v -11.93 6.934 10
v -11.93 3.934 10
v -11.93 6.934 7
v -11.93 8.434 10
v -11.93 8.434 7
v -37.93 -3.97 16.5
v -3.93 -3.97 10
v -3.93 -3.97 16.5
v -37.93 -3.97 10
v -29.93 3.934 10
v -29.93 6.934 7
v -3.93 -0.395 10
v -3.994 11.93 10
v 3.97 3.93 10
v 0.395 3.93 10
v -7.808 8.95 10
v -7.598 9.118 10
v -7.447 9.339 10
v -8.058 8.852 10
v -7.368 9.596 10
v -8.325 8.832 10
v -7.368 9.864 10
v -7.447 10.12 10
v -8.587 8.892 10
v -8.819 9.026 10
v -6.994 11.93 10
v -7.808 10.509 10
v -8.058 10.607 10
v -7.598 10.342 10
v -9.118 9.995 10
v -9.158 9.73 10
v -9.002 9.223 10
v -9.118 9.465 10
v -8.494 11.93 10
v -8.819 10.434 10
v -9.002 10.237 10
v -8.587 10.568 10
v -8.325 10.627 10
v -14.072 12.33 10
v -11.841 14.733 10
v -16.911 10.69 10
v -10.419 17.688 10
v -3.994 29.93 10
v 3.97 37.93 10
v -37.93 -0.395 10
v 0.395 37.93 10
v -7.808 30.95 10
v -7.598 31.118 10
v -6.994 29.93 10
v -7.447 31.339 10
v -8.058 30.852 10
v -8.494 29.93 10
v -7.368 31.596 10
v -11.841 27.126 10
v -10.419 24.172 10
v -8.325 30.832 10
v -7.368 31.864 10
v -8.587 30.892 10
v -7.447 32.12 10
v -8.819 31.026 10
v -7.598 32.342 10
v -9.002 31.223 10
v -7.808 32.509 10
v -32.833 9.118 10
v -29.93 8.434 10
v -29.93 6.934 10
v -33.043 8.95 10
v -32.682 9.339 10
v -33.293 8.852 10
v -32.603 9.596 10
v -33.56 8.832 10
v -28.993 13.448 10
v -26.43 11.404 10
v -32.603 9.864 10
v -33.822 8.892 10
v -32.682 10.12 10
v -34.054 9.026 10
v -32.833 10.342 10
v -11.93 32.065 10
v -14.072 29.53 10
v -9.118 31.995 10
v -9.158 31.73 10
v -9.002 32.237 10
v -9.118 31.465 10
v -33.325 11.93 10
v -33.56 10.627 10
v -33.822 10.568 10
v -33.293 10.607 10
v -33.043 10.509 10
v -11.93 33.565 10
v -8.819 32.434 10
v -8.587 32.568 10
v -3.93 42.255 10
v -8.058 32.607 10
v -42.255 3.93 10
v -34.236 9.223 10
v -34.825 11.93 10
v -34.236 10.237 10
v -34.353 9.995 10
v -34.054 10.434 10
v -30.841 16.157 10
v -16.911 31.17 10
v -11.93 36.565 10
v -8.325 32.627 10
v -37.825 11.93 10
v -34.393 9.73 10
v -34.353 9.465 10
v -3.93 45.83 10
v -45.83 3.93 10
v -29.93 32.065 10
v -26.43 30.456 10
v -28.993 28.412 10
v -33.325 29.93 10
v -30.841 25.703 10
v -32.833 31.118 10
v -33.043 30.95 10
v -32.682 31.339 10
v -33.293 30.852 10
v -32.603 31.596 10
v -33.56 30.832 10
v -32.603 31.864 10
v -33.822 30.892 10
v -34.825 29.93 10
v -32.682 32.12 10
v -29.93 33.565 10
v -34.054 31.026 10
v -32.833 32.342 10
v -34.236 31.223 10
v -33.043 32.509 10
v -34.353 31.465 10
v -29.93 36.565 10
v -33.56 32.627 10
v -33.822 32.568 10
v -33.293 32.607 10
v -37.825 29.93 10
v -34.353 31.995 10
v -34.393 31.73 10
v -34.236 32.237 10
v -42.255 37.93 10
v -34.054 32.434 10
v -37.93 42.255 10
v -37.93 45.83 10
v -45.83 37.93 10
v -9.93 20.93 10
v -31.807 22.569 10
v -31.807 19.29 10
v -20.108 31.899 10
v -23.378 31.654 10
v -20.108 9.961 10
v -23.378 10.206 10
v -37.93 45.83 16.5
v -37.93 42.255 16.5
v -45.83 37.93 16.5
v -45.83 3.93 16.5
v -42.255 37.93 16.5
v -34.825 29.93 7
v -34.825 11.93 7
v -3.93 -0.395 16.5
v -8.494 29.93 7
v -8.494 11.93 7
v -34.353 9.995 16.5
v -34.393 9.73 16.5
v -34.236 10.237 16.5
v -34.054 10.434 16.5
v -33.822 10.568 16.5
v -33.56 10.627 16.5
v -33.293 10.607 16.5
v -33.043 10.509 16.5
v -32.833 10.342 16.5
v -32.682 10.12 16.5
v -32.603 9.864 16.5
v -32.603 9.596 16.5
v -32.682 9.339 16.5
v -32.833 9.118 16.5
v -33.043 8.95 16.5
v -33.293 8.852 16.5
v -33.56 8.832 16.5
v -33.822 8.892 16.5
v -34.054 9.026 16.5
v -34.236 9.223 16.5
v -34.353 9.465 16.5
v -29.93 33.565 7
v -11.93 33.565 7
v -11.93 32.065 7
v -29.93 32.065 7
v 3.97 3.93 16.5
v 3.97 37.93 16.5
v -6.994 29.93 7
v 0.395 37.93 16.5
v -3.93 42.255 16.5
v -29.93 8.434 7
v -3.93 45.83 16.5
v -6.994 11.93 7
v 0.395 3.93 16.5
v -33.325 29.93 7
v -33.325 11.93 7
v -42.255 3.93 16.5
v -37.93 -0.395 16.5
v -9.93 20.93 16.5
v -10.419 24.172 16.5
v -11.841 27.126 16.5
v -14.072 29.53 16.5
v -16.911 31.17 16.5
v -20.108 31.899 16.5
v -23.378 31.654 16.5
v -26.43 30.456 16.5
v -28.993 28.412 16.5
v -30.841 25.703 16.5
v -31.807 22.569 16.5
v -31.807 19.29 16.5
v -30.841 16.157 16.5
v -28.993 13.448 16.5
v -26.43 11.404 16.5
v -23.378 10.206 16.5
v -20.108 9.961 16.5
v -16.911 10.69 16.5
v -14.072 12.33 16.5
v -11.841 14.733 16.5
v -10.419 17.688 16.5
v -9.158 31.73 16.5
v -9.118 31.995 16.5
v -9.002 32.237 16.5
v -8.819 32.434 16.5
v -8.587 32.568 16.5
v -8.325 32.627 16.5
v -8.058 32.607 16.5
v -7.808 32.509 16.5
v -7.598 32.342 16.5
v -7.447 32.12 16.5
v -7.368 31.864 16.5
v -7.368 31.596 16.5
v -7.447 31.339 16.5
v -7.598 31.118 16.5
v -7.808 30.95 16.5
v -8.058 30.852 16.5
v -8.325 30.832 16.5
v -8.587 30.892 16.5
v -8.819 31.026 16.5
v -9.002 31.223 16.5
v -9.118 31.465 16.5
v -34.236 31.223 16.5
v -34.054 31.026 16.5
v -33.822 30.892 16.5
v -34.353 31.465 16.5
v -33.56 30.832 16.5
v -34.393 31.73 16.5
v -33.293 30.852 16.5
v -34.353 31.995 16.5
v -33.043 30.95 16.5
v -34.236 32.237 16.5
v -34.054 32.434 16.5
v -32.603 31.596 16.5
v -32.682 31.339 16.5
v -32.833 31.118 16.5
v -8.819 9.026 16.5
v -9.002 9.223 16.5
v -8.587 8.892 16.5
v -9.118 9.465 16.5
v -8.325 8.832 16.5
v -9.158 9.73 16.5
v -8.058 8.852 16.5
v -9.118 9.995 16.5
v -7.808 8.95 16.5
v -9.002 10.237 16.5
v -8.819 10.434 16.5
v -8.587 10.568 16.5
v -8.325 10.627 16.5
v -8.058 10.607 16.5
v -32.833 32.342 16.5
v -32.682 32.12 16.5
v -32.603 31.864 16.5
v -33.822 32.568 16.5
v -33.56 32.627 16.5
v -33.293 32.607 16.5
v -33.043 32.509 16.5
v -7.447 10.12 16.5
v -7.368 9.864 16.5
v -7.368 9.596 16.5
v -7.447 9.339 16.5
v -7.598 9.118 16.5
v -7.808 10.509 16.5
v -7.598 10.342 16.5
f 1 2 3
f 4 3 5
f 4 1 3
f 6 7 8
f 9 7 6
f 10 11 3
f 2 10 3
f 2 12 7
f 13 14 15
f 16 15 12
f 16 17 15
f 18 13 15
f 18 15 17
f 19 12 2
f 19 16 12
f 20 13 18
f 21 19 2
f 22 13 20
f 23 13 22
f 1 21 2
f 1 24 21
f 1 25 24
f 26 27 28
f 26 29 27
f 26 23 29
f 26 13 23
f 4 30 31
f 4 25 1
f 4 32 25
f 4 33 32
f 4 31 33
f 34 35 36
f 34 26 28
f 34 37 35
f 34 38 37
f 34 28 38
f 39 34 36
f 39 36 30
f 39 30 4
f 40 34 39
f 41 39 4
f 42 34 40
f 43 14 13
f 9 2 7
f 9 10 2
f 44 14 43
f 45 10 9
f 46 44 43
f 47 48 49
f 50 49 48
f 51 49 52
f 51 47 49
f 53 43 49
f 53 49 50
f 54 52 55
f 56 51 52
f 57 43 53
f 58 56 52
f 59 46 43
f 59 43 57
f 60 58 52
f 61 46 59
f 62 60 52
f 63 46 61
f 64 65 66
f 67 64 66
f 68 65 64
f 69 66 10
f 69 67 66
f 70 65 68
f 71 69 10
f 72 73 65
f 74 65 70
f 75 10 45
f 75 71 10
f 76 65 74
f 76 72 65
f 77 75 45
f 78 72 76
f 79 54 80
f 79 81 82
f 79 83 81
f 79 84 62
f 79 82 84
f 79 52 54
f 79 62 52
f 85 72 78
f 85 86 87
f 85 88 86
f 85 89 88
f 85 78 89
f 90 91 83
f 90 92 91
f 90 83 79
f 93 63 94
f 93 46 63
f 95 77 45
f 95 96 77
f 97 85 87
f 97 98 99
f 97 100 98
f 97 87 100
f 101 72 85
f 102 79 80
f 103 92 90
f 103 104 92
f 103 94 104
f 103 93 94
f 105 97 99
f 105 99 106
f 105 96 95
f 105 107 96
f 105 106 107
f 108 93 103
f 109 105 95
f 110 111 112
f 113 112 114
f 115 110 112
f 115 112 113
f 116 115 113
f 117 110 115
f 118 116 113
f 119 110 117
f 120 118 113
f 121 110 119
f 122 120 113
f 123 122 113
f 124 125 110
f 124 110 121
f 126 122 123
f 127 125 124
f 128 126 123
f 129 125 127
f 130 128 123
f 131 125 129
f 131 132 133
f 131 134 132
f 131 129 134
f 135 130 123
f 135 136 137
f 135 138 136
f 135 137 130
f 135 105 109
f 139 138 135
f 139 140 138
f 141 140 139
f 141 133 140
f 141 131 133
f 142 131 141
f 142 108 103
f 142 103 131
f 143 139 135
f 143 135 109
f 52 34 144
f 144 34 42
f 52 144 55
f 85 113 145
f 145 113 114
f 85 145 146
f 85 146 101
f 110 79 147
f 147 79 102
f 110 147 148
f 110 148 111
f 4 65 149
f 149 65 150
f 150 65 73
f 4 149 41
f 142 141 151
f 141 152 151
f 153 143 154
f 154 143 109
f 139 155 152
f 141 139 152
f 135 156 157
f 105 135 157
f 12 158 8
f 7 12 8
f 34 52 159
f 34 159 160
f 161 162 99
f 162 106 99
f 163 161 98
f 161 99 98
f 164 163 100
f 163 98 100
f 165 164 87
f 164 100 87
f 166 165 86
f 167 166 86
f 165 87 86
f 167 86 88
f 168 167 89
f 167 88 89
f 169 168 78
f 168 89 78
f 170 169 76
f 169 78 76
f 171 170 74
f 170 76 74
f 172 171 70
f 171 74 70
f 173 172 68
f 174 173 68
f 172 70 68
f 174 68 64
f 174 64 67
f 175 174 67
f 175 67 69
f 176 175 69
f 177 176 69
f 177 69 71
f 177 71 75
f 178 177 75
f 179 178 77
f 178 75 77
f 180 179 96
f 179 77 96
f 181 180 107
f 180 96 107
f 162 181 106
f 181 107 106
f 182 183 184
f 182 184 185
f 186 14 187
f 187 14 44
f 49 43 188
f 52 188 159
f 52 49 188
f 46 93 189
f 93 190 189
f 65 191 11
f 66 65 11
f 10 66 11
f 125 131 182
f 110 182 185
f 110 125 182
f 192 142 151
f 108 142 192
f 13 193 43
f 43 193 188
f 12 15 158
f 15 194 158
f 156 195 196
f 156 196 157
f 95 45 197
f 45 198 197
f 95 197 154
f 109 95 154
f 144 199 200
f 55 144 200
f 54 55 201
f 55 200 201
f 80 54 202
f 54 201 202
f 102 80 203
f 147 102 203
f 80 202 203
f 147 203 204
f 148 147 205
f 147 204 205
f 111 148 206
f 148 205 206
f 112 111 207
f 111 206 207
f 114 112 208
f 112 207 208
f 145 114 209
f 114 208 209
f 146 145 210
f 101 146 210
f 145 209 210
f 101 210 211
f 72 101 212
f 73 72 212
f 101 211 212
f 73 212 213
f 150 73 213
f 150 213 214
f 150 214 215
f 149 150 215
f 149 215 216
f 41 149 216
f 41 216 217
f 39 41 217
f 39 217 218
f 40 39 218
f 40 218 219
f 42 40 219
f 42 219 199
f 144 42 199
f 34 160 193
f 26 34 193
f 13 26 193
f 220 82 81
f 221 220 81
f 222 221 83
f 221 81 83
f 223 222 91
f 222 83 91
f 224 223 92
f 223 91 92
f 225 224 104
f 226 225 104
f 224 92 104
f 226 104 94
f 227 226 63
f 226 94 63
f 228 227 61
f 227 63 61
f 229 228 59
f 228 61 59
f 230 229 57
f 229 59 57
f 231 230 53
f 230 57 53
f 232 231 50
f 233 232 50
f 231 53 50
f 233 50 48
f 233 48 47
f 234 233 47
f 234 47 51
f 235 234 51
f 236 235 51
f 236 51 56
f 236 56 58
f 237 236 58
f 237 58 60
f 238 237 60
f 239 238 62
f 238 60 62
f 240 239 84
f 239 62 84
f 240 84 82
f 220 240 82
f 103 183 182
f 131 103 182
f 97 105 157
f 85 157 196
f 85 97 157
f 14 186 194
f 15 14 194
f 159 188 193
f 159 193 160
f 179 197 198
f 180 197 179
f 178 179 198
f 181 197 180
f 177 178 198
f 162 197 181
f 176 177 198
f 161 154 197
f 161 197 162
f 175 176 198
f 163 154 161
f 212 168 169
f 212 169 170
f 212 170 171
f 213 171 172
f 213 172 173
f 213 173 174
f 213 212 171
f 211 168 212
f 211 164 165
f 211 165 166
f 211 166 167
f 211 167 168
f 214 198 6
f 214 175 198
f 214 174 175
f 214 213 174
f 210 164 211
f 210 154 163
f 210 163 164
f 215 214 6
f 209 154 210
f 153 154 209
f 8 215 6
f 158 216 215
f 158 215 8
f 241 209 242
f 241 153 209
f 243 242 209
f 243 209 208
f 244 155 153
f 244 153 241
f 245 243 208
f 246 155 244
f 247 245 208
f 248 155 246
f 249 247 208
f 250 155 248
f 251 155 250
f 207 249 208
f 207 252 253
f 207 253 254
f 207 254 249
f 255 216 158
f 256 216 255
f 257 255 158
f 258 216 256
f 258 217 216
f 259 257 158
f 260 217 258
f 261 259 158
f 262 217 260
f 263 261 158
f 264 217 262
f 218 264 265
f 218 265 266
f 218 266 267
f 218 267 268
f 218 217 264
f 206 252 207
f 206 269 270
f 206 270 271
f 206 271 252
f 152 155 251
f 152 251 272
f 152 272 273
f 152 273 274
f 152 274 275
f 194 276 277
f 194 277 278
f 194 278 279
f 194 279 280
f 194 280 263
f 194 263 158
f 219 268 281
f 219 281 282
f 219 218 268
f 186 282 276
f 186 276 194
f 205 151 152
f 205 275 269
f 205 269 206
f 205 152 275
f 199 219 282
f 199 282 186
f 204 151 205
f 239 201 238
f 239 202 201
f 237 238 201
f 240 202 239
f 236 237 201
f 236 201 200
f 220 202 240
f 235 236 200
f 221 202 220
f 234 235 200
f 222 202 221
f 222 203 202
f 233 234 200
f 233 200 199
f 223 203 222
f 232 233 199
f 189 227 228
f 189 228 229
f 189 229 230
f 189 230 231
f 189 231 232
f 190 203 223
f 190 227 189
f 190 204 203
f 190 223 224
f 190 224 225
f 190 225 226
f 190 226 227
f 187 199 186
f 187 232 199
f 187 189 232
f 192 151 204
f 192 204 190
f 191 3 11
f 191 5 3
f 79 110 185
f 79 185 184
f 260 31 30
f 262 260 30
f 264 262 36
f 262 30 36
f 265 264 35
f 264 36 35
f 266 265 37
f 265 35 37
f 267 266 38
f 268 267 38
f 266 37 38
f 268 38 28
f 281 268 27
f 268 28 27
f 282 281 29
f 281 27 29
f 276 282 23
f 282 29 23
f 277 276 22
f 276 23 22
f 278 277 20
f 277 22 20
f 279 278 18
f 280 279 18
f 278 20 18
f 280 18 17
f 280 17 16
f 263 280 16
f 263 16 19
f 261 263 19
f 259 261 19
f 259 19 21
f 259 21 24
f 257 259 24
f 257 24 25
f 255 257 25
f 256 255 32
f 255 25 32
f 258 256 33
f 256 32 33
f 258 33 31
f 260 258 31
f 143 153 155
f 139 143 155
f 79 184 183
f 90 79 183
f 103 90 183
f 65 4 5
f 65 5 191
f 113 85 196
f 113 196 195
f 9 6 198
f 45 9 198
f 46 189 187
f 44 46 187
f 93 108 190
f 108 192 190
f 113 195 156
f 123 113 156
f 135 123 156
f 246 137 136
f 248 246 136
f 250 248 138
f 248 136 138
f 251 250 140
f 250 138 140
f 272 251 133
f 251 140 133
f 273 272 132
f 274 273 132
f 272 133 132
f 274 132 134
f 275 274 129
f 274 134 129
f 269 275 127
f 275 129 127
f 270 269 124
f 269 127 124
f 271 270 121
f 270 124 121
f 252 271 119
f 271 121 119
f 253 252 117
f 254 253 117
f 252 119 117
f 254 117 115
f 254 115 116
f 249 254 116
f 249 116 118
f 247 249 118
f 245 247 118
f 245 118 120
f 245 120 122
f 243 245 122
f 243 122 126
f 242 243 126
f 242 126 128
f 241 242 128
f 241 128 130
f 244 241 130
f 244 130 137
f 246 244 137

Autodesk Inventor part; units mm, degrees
ref_plane "YZ Plane" through (0, 0, 0) normal (1, 0, 0) x (0, 1, 0)
ref_plane "Work Plane1" through (0, 0, 10) normal (0, 0, 1) x (1, 0, 0)
sketch "Sketch1" plane through (0, 0, 10) normal (0, 0, 1) x (1, 0, 0)
  line L0 (-4.0299, -0.3538) -> (-2.2322, 1.4439) construction
  arc A0 (-1.4439, 2.2322) -> (-2.2322, 1.4439) centre (-0.9299, 0.9299) ccw construction
  line L1 (-1.4439, 2.2322) -> (0.3538, 4.0299) construction
  line L2 (-37.8299, 42.2137) -> (-37.8299, 45.8299) construction
  line L3 (-37.8299, 45.8299) -> (-4.0299, 45.8299) construction
  line L4 (-4.0299, 45.8299) -> (-4.0299, 42.2137) construction
  line L5 (-4.0299, 4.0299) -> (0.3538, 4.0299) projected
  line L6 (-20.9299, 58.9723) -> (17.1124, 20.9299) construction
  line L7 (17.1124, 20.9299) -> (-20.9299, -17.1124) construction
  line L8 (-20.9299, -17.1124) -> (-58.9723, 20.9299) construction
  line L9 (-58.9723, 20.9299) -> (-20.9299, 58.9723) construction
  line L10 (-20.9299, 58.9723) -> (-20.9299, -17.1124) construction
  line L11 (17.1124, 20.9299) -> (-58.9723, 20.9299) construction
  line L12 (-20.9299, 58.9723) -> (32.8701, 58.9723) construction
  line L13 (-43.4299, 43.4299) -> (1.5701, 43.4299) construction
  line L14 (1.5701, 43.4299) -> (1.5701, -1.5701) construction
  line L15 (1.5701, -1.5701) -> (-43.4299, -1.5701) construction
  line L16 (-43.4299, -1.5701) -> (-43.4299, 43.4299) construction
  line L17 (-43.4299, 43.4299) -> (1.5701, -1.5701) construction
  line L18 (1.5701, 43.4299) -> (-43.4299, -1.5701) construction
  line L19 (-43.4299, 5.3876) -> (-43.4299, 36.4723)
  line L20 (-43.4299, 36.4723) -> (-36.4723, 43.4299)
  line L21 (-36.4723, 43.4299) -> (-5.3876, 43.4299)
  line L22 (-5.3876, 43.4299) -> (1.5701, 36.4723)
  line L23 (1.5701, 36.4723) -> (1.5701, 5.3876)
  line L24 (1.5701, 5.3876) -> (-5.3876, -1.5701)
  line L25 (-5.3876, -1.5701) -> (-36.4723, -1.5701)
  line L26 (-36.4723, -1.5701) -> (-43.4299, 5.3876)
  line L27 (-4.0299, 42.2137) -> (-37.8299, 42.2137) projected
  line L28 (-4.0299, -0.3538) -> (-4.0299, 4.0299) projected
  circle A1 centre (-20.9299, 20.9299) radius 13.3985
  circle A2 centre (-20.9299, 20.9299) radius 15.4895
  point P0 (-37.8299, 4.0299)
  dimension "d18" = 53.8
  dimension "d19" = 45
  dimension "d20" = 53.8
  dimension "d21" = 45
  dimension "d22" = 45
  dimension "d30" = 26.797
  dimension "d36" = 30.979
extrude "Extrusion1" add sketch "Sketch1" along normal blind 6.5 contours L28 L24 L25 L26 L19 L20 L27 L22 L23 L5 | L5 L24 L28 | L27 L20 L21 L22 | A1 | A2
ref_plane "Work Plane2" through (-40.9959, 0.8639, 22.2359) normal (0, 0, 1) x (1, 0, 0)
sketch "Sketch3" plane through (0, 0, 10) normal (0, 0, -1) x (-1, 0, 0)
  line L0 (37.8299, -0.4701) -> (37.8299, 4.0299) construction
  line L1 (4.0299, 4.0299) -> (4.0299, -0.4701) construction
  line L2 (37.8299, -0.4701) -> (37.8299, 1.1886) construction
  line L3 (4.0299, -3.9701) -> (4.0299, -0.3538) construction
  line L4 (45.8299, 4.0299) -> (42.2137, 4.0299) construction
  line L5 (-0.3538, 4.0299) -> (-3.9701, 4.0299) construction
  line L6 (-3.9701, 37.8299) -> (-0.3538, 37.8299) construction
  line L7 (4.0299, 42.2137) -> (4.0299, 45.8299) construction
  line L8 (37.8299, 45.8299) -> (37.8299, 42.2137) construction
  line L9 (42.2137, 37.8299) -> (45.8299, 37.8299) construction
  line L10 (37.8299, 37.7299) -> (45.8299, 37.7299)
  line L11 (45.8299, 37.7299) -> (45.8299, 4.1299)
  line L12 (45.8299, 4.1299) -> (37.8299, 4.1299)
  line L13 (37.8299, 4.1299) -> (37.8299, 37.7299)
  line L14 (37.7299, 4.0299) -> (4.1299, 4.0299)
  line L15 (4.1299, 4.0299) -> (4.1299, -3.9701)
  line L16 (4.1299, -3.9701) -> (37.7299, -3.9701)
  line L17 (37.7299, -3.9701) -> (37.7299, 4.0299)
  line L18 (4.0299, 4.1299) -> (-3.9701, 4.1299)
  line L19 (-3.9701, 4.1299) -> (-3.9701, 37.7299)
  line L20 (-3.9701, 37.7299) -> (4.0299, 37.7299)
  line L21 (4.0299, 37.7299) -> (4.0299, 4.1299)
  line L22 (4.1299, 37.8299) -> (37.7299, 37.8299)
  line L23 (37.7299, 37.8299) -> (37.7299, 45.8299)
  line L24 (37.7299, 45.8299) -> (4.1299, 45.8299)
  line L25 (4.1299, 45.8299) -> (4.1299, 37.8299)
  point P0 (0, 0)
  dimension "d23" = 0.1
  dimension "d24" = 0.1
  dimension "d25" = 0.1
  dimension "d26" = 0.1
  dimension "d27" = 0.1
extrude "Extrusion3" add sketch "Sketch3" against normal up to surface (6.5 mm away)
sketch "Sketch6" plane through (0, 0, 16.5) normal (0, 0, 1) x (1, 0, 0)
  circle A0 centre (-20.9299, 20.9299) radius 15.4895
  circle A1 centre (-20.9299, 20.9299) radius 11
  line L0 (-45.8299, 4.1299) -> (-45.8299, 37.7299) projected
  line L1 (-4.1299, -3.9701) -> (-37.7299, -3.9701) projected
  line L2 (-37.7299, 45.8299) -> (-4.1299, 45.8299) projected
  point P0 (0, 0)
  point P1 (-45.8299, 20.9299)
  point P2 (-20.9299, -3.9701)
  point P3 (-20.9299, 45.8299)
  dimension "d37" = 22
  dimension "d38" = 30.979
extrude "Extrusion5" cut sketch "Sketch6" against normal blind 12 contours A1
sketch "Skizze12" plane through (0, 0, 16.5) normal (0, 0, 1) x (1, 0, 0)
  circle A0 centre (-20.9299, 20.9299) radius 11 construction
  line L0 (3.9701, 4.1299) -> (0.3124, 4.1299) projected
  line L1 (3.9701, 37.7299) -> (3.9701, 4.1299) construction
  line L2 (0.3124, 37.7299) -> (3.9701, 37.7299) projected
  line L3 (0.3124, 37.7299) -> (-4.1299, 42.1723) projected
  line L4 (-4.1299, 45.8299) -> (-4.1299, 42.1723) projected
  line L5 (-37.7299, 45.8299) -> (-4.1299, 45.8299) construction
  line L6 (-37.7299, 42.1723) -> (-37.7299, 45.8299) projected
  line L7 (-37.7299, 42.1723) -> (-42.1723, 37.7299) projected
  line L8 (-45.8299, 37.7299) -> (-42.1723, 37.7299) projected
  line L9 (-45.8299, 4.1299) -> (-45.8299, 37.7299) construction
  line L10 (-42.1723, 4.1299) -> (-45.8299, 4.1299) projected
  line L11 (-42.1723, 4.1299) -> (-37.7299, -0.3124) projected
  line L12 (-37.7299, -3.9701) -> (-37.7299, -0.3124) projected
  line L13 (-4.1299, -3.9701) -> (-37.7299, -3.9701) construction
  line L14 (-4.1299, -0.3124) -> (-4.1299, -3.9701) projected
  line L15 (-4.1299, -0.3124) -> (0.3124, 4.1299) projected
  line L16 (-3.9299, 46.0299) -> (-3.9299, 42.2551)
  line L17 (-3.9299, 42.2551) -> (0.3953, 37.9299)
  line L18 (0.3953, 37.9299) -> (4.1701, 37.9299)
  line L19 (4.1701, 37.9299) -> (4.1701, 3.9299) construction
  line L20 (4.1701, 3.9299) -> (0.3953, 3.9299)
  line L21 (0.3953, 3.9299) -> (-3.9299, -0.3953)
  line L22 (-3.9299, -0.3953) -> (-3.9299, -4.1701)
  line L23 (-3.9299, -4.1701) -> (-37.9299, -4.1701) construction
  line L24 (-37.9299, -4.1701) -> (-37.9299, -0.3953)
  line L25 (-37.9299, -0.3953) -> (-42.2551, 3.9299)
  line L26 (-42.2551, 3.9299) -> (-46.0299, 3.9299)
  line L27 (-46.0299, 3.9299) -> (-46.0299, 37.9299) construction
  line L28 (-46.0299, 37.9299) -> (-42.2551, 37.9299)
  line L29 (-42.2551, 37.9299) -> (-37.9299, 42.2551)
  line L30 (-37.9299, 42.2551) -> (-37.9299, 46.0299)
  line L31 (-37.9299, 46.0299) -> (-3.9299, 46.0299) construction
  line L32 (-45.8299, 37.7299) -> (-45.8299, 37.9299)
  line L33 (-37.7299, 45.8299) -> (-37.9299, 45.8299)
  line L34 (-4.1299, 45.8299) -> (-3.9299, 45.8299)
  line L35 (3.9701, 37.7299) -> (3.9701, 37.9299)
  line L36 (3.9701, 4.1299) -> (0.3124, 4.1299) projected
  line L37 (3.9701, 4.1299) -> (3.9701, 3.9299)
  line L38 (-4.1299, -3.9701) -> (-3.9299, -3.9701)
  line L39 (-37.7299, -3.9701) -> (-37.9299, -3.9701)
  line L40 (-45.8299, 4.1299) -> (-45.8299, 3.9299)
  point P0 (0, 0)
  dimension "d93" = 0.2
extrude "IM_offset" add sketch "Skizze12" against normal up to surface (6.5 mm away)
sketch "Sketch13" plane through (0, 0, 10) normal (0, 0, -1) x (-1, 0, 0)
  arc A0 (8.6799, 30.7299) -> (8.6799, 32.7299) centre (8.6799, 31.7299) ccw projected
  arc A1 (33.1799, 32.7299) -> (33.1799, 30.7299) centre (33.1799, 31.7299) ccw projected
  arc A2 (33.1799, 10.7299) -> (33.1799, 8.7299) centre (33.1799, 9.7299) ccw projected
  arc A3 (8.6799, 8.7299) -> (8.6799, 10.7299) centre (8.6799, 9.7299) ccw projected
  circle A4 centre (8.258, 9.7299) radius 0.9
  circle A5 centre (8.258, 31.7299) radius 0.9
  circle A6 centre (33.4928, 31.7299) radius 0.9
  circle A7 centre (33.4928, 9.7299) radius 0.9
  point P0 (0, 0)
  dimension "d96" = 1.8
  dimension "d97" = 1.8
  dimension "d98" = 1.8
  dimension "d99" = 1.8
extrude "Extrusion9" cut sketch "Sketch13" against normal blind 10
sketch "Sketch14" plane through (0, 0, 10) normal (0, 0, -1) x (-1, 0, 0)
  circle A0 centre (20.9299, 20.9299) radius 11 projected
  line L0 (29.9299, 32.0648) -> (11.9299, 32.0648)
  line L1 (11.9299, 32.0648) -> (11.9299, 33.5648)
  line L2 (11.9299, 33.5648) -> (29.9299, 33.5648)
  line L3 (29.9299, 33.5648) -> (29.9299, 32.0648)
  line L4 (29.9299, 32.0648) -> (11.9299, 33.5648) construction
  line L5 (11.9299, 32.0648) -> (29.9299, 33.5648) construction
  line L6 (29.9299, 6.9335) -> (11.9299, 6.9335)
  line L7 (11.9299, 6.9335) -> (11.9299, 8.4335)
  line L8 (11.9299, 8.4335) -> (29.9299, 8.4335)
  line L9 (29.9299, 8.4335) -> (29.9299, 6.9335)
  line L10 (29.9299, 6.9335) -> (11.9299, 8.4335) construction
  line L11 (11.9299, 6.9335) -> (29.9299, 8.4335) construction
  line L12 (6.9935, 29.9299) -> (8.4935, 29.9299)
  line L13 (8.4935, 29.9299) -> (8.4935, 11.9299)
  line L14 (8.4935, 11.9299) -> (6.9935, 11.9299)
  line L15 (6.9935, 11.9299) -> (6.9935, 29.9299)
  line L16 (6.9935, 29.9299) -> (8.4935, 11.9299) construction
  line L17 (8.4935, 29.9299) -> (6.9935, 11.9299) construction
  line L18 (33.3254, 29.9299) -> (34.8254, 29.9299)
  line L19 (34.8254, 29.9299) -> (34.8254, 11.9299)
  line L20 (34.8254, 11.9299) -> (33.3254, 11.9299)
  line L21 (33.3254, 11.9299) -> (33.3254, 29.9299)
  line L22 (33.3254, 29.9299) -> (34.8254, 11.9299) construction
  line L23 (34.8254, 29.9299) -> (33.3254, 11.9299) construction
  point P0 (0, 0)
  point P1 (20.9299, 32.8148)
  point P2 (20.9299, 7.6835)
  point P3 (7.7435, 20.9299)
  point P4 (34.0754, 20.9299)
  dimension "d102" = 18
  dimension "d103" = 1.5
  dimension "d104" = 1.5
  dimension "d105" = 1.5
  dimension "d106" = 18
  dimension "d107" = 1.5
  dimension "d108" = 18
extrude "Extrusion10" add sketch "Sketch14" along normal blind 3 contours L0 L1 L2 L3 | L6 L7 L8 L9 | L12 L13 L14 L15 | L18 L19 L20 L21
chamfer "Chamfer1" distance 3 angle 45 4 edges at (-20.9299, 6.9335, 10) (-6.9935, 20.9299, 10) (-20.9299, 33.5648, 10) (-34.8254, 20.9299, 10)
properties part number "20_Cube_Insert_Laser_Holder_fixed_v3"
